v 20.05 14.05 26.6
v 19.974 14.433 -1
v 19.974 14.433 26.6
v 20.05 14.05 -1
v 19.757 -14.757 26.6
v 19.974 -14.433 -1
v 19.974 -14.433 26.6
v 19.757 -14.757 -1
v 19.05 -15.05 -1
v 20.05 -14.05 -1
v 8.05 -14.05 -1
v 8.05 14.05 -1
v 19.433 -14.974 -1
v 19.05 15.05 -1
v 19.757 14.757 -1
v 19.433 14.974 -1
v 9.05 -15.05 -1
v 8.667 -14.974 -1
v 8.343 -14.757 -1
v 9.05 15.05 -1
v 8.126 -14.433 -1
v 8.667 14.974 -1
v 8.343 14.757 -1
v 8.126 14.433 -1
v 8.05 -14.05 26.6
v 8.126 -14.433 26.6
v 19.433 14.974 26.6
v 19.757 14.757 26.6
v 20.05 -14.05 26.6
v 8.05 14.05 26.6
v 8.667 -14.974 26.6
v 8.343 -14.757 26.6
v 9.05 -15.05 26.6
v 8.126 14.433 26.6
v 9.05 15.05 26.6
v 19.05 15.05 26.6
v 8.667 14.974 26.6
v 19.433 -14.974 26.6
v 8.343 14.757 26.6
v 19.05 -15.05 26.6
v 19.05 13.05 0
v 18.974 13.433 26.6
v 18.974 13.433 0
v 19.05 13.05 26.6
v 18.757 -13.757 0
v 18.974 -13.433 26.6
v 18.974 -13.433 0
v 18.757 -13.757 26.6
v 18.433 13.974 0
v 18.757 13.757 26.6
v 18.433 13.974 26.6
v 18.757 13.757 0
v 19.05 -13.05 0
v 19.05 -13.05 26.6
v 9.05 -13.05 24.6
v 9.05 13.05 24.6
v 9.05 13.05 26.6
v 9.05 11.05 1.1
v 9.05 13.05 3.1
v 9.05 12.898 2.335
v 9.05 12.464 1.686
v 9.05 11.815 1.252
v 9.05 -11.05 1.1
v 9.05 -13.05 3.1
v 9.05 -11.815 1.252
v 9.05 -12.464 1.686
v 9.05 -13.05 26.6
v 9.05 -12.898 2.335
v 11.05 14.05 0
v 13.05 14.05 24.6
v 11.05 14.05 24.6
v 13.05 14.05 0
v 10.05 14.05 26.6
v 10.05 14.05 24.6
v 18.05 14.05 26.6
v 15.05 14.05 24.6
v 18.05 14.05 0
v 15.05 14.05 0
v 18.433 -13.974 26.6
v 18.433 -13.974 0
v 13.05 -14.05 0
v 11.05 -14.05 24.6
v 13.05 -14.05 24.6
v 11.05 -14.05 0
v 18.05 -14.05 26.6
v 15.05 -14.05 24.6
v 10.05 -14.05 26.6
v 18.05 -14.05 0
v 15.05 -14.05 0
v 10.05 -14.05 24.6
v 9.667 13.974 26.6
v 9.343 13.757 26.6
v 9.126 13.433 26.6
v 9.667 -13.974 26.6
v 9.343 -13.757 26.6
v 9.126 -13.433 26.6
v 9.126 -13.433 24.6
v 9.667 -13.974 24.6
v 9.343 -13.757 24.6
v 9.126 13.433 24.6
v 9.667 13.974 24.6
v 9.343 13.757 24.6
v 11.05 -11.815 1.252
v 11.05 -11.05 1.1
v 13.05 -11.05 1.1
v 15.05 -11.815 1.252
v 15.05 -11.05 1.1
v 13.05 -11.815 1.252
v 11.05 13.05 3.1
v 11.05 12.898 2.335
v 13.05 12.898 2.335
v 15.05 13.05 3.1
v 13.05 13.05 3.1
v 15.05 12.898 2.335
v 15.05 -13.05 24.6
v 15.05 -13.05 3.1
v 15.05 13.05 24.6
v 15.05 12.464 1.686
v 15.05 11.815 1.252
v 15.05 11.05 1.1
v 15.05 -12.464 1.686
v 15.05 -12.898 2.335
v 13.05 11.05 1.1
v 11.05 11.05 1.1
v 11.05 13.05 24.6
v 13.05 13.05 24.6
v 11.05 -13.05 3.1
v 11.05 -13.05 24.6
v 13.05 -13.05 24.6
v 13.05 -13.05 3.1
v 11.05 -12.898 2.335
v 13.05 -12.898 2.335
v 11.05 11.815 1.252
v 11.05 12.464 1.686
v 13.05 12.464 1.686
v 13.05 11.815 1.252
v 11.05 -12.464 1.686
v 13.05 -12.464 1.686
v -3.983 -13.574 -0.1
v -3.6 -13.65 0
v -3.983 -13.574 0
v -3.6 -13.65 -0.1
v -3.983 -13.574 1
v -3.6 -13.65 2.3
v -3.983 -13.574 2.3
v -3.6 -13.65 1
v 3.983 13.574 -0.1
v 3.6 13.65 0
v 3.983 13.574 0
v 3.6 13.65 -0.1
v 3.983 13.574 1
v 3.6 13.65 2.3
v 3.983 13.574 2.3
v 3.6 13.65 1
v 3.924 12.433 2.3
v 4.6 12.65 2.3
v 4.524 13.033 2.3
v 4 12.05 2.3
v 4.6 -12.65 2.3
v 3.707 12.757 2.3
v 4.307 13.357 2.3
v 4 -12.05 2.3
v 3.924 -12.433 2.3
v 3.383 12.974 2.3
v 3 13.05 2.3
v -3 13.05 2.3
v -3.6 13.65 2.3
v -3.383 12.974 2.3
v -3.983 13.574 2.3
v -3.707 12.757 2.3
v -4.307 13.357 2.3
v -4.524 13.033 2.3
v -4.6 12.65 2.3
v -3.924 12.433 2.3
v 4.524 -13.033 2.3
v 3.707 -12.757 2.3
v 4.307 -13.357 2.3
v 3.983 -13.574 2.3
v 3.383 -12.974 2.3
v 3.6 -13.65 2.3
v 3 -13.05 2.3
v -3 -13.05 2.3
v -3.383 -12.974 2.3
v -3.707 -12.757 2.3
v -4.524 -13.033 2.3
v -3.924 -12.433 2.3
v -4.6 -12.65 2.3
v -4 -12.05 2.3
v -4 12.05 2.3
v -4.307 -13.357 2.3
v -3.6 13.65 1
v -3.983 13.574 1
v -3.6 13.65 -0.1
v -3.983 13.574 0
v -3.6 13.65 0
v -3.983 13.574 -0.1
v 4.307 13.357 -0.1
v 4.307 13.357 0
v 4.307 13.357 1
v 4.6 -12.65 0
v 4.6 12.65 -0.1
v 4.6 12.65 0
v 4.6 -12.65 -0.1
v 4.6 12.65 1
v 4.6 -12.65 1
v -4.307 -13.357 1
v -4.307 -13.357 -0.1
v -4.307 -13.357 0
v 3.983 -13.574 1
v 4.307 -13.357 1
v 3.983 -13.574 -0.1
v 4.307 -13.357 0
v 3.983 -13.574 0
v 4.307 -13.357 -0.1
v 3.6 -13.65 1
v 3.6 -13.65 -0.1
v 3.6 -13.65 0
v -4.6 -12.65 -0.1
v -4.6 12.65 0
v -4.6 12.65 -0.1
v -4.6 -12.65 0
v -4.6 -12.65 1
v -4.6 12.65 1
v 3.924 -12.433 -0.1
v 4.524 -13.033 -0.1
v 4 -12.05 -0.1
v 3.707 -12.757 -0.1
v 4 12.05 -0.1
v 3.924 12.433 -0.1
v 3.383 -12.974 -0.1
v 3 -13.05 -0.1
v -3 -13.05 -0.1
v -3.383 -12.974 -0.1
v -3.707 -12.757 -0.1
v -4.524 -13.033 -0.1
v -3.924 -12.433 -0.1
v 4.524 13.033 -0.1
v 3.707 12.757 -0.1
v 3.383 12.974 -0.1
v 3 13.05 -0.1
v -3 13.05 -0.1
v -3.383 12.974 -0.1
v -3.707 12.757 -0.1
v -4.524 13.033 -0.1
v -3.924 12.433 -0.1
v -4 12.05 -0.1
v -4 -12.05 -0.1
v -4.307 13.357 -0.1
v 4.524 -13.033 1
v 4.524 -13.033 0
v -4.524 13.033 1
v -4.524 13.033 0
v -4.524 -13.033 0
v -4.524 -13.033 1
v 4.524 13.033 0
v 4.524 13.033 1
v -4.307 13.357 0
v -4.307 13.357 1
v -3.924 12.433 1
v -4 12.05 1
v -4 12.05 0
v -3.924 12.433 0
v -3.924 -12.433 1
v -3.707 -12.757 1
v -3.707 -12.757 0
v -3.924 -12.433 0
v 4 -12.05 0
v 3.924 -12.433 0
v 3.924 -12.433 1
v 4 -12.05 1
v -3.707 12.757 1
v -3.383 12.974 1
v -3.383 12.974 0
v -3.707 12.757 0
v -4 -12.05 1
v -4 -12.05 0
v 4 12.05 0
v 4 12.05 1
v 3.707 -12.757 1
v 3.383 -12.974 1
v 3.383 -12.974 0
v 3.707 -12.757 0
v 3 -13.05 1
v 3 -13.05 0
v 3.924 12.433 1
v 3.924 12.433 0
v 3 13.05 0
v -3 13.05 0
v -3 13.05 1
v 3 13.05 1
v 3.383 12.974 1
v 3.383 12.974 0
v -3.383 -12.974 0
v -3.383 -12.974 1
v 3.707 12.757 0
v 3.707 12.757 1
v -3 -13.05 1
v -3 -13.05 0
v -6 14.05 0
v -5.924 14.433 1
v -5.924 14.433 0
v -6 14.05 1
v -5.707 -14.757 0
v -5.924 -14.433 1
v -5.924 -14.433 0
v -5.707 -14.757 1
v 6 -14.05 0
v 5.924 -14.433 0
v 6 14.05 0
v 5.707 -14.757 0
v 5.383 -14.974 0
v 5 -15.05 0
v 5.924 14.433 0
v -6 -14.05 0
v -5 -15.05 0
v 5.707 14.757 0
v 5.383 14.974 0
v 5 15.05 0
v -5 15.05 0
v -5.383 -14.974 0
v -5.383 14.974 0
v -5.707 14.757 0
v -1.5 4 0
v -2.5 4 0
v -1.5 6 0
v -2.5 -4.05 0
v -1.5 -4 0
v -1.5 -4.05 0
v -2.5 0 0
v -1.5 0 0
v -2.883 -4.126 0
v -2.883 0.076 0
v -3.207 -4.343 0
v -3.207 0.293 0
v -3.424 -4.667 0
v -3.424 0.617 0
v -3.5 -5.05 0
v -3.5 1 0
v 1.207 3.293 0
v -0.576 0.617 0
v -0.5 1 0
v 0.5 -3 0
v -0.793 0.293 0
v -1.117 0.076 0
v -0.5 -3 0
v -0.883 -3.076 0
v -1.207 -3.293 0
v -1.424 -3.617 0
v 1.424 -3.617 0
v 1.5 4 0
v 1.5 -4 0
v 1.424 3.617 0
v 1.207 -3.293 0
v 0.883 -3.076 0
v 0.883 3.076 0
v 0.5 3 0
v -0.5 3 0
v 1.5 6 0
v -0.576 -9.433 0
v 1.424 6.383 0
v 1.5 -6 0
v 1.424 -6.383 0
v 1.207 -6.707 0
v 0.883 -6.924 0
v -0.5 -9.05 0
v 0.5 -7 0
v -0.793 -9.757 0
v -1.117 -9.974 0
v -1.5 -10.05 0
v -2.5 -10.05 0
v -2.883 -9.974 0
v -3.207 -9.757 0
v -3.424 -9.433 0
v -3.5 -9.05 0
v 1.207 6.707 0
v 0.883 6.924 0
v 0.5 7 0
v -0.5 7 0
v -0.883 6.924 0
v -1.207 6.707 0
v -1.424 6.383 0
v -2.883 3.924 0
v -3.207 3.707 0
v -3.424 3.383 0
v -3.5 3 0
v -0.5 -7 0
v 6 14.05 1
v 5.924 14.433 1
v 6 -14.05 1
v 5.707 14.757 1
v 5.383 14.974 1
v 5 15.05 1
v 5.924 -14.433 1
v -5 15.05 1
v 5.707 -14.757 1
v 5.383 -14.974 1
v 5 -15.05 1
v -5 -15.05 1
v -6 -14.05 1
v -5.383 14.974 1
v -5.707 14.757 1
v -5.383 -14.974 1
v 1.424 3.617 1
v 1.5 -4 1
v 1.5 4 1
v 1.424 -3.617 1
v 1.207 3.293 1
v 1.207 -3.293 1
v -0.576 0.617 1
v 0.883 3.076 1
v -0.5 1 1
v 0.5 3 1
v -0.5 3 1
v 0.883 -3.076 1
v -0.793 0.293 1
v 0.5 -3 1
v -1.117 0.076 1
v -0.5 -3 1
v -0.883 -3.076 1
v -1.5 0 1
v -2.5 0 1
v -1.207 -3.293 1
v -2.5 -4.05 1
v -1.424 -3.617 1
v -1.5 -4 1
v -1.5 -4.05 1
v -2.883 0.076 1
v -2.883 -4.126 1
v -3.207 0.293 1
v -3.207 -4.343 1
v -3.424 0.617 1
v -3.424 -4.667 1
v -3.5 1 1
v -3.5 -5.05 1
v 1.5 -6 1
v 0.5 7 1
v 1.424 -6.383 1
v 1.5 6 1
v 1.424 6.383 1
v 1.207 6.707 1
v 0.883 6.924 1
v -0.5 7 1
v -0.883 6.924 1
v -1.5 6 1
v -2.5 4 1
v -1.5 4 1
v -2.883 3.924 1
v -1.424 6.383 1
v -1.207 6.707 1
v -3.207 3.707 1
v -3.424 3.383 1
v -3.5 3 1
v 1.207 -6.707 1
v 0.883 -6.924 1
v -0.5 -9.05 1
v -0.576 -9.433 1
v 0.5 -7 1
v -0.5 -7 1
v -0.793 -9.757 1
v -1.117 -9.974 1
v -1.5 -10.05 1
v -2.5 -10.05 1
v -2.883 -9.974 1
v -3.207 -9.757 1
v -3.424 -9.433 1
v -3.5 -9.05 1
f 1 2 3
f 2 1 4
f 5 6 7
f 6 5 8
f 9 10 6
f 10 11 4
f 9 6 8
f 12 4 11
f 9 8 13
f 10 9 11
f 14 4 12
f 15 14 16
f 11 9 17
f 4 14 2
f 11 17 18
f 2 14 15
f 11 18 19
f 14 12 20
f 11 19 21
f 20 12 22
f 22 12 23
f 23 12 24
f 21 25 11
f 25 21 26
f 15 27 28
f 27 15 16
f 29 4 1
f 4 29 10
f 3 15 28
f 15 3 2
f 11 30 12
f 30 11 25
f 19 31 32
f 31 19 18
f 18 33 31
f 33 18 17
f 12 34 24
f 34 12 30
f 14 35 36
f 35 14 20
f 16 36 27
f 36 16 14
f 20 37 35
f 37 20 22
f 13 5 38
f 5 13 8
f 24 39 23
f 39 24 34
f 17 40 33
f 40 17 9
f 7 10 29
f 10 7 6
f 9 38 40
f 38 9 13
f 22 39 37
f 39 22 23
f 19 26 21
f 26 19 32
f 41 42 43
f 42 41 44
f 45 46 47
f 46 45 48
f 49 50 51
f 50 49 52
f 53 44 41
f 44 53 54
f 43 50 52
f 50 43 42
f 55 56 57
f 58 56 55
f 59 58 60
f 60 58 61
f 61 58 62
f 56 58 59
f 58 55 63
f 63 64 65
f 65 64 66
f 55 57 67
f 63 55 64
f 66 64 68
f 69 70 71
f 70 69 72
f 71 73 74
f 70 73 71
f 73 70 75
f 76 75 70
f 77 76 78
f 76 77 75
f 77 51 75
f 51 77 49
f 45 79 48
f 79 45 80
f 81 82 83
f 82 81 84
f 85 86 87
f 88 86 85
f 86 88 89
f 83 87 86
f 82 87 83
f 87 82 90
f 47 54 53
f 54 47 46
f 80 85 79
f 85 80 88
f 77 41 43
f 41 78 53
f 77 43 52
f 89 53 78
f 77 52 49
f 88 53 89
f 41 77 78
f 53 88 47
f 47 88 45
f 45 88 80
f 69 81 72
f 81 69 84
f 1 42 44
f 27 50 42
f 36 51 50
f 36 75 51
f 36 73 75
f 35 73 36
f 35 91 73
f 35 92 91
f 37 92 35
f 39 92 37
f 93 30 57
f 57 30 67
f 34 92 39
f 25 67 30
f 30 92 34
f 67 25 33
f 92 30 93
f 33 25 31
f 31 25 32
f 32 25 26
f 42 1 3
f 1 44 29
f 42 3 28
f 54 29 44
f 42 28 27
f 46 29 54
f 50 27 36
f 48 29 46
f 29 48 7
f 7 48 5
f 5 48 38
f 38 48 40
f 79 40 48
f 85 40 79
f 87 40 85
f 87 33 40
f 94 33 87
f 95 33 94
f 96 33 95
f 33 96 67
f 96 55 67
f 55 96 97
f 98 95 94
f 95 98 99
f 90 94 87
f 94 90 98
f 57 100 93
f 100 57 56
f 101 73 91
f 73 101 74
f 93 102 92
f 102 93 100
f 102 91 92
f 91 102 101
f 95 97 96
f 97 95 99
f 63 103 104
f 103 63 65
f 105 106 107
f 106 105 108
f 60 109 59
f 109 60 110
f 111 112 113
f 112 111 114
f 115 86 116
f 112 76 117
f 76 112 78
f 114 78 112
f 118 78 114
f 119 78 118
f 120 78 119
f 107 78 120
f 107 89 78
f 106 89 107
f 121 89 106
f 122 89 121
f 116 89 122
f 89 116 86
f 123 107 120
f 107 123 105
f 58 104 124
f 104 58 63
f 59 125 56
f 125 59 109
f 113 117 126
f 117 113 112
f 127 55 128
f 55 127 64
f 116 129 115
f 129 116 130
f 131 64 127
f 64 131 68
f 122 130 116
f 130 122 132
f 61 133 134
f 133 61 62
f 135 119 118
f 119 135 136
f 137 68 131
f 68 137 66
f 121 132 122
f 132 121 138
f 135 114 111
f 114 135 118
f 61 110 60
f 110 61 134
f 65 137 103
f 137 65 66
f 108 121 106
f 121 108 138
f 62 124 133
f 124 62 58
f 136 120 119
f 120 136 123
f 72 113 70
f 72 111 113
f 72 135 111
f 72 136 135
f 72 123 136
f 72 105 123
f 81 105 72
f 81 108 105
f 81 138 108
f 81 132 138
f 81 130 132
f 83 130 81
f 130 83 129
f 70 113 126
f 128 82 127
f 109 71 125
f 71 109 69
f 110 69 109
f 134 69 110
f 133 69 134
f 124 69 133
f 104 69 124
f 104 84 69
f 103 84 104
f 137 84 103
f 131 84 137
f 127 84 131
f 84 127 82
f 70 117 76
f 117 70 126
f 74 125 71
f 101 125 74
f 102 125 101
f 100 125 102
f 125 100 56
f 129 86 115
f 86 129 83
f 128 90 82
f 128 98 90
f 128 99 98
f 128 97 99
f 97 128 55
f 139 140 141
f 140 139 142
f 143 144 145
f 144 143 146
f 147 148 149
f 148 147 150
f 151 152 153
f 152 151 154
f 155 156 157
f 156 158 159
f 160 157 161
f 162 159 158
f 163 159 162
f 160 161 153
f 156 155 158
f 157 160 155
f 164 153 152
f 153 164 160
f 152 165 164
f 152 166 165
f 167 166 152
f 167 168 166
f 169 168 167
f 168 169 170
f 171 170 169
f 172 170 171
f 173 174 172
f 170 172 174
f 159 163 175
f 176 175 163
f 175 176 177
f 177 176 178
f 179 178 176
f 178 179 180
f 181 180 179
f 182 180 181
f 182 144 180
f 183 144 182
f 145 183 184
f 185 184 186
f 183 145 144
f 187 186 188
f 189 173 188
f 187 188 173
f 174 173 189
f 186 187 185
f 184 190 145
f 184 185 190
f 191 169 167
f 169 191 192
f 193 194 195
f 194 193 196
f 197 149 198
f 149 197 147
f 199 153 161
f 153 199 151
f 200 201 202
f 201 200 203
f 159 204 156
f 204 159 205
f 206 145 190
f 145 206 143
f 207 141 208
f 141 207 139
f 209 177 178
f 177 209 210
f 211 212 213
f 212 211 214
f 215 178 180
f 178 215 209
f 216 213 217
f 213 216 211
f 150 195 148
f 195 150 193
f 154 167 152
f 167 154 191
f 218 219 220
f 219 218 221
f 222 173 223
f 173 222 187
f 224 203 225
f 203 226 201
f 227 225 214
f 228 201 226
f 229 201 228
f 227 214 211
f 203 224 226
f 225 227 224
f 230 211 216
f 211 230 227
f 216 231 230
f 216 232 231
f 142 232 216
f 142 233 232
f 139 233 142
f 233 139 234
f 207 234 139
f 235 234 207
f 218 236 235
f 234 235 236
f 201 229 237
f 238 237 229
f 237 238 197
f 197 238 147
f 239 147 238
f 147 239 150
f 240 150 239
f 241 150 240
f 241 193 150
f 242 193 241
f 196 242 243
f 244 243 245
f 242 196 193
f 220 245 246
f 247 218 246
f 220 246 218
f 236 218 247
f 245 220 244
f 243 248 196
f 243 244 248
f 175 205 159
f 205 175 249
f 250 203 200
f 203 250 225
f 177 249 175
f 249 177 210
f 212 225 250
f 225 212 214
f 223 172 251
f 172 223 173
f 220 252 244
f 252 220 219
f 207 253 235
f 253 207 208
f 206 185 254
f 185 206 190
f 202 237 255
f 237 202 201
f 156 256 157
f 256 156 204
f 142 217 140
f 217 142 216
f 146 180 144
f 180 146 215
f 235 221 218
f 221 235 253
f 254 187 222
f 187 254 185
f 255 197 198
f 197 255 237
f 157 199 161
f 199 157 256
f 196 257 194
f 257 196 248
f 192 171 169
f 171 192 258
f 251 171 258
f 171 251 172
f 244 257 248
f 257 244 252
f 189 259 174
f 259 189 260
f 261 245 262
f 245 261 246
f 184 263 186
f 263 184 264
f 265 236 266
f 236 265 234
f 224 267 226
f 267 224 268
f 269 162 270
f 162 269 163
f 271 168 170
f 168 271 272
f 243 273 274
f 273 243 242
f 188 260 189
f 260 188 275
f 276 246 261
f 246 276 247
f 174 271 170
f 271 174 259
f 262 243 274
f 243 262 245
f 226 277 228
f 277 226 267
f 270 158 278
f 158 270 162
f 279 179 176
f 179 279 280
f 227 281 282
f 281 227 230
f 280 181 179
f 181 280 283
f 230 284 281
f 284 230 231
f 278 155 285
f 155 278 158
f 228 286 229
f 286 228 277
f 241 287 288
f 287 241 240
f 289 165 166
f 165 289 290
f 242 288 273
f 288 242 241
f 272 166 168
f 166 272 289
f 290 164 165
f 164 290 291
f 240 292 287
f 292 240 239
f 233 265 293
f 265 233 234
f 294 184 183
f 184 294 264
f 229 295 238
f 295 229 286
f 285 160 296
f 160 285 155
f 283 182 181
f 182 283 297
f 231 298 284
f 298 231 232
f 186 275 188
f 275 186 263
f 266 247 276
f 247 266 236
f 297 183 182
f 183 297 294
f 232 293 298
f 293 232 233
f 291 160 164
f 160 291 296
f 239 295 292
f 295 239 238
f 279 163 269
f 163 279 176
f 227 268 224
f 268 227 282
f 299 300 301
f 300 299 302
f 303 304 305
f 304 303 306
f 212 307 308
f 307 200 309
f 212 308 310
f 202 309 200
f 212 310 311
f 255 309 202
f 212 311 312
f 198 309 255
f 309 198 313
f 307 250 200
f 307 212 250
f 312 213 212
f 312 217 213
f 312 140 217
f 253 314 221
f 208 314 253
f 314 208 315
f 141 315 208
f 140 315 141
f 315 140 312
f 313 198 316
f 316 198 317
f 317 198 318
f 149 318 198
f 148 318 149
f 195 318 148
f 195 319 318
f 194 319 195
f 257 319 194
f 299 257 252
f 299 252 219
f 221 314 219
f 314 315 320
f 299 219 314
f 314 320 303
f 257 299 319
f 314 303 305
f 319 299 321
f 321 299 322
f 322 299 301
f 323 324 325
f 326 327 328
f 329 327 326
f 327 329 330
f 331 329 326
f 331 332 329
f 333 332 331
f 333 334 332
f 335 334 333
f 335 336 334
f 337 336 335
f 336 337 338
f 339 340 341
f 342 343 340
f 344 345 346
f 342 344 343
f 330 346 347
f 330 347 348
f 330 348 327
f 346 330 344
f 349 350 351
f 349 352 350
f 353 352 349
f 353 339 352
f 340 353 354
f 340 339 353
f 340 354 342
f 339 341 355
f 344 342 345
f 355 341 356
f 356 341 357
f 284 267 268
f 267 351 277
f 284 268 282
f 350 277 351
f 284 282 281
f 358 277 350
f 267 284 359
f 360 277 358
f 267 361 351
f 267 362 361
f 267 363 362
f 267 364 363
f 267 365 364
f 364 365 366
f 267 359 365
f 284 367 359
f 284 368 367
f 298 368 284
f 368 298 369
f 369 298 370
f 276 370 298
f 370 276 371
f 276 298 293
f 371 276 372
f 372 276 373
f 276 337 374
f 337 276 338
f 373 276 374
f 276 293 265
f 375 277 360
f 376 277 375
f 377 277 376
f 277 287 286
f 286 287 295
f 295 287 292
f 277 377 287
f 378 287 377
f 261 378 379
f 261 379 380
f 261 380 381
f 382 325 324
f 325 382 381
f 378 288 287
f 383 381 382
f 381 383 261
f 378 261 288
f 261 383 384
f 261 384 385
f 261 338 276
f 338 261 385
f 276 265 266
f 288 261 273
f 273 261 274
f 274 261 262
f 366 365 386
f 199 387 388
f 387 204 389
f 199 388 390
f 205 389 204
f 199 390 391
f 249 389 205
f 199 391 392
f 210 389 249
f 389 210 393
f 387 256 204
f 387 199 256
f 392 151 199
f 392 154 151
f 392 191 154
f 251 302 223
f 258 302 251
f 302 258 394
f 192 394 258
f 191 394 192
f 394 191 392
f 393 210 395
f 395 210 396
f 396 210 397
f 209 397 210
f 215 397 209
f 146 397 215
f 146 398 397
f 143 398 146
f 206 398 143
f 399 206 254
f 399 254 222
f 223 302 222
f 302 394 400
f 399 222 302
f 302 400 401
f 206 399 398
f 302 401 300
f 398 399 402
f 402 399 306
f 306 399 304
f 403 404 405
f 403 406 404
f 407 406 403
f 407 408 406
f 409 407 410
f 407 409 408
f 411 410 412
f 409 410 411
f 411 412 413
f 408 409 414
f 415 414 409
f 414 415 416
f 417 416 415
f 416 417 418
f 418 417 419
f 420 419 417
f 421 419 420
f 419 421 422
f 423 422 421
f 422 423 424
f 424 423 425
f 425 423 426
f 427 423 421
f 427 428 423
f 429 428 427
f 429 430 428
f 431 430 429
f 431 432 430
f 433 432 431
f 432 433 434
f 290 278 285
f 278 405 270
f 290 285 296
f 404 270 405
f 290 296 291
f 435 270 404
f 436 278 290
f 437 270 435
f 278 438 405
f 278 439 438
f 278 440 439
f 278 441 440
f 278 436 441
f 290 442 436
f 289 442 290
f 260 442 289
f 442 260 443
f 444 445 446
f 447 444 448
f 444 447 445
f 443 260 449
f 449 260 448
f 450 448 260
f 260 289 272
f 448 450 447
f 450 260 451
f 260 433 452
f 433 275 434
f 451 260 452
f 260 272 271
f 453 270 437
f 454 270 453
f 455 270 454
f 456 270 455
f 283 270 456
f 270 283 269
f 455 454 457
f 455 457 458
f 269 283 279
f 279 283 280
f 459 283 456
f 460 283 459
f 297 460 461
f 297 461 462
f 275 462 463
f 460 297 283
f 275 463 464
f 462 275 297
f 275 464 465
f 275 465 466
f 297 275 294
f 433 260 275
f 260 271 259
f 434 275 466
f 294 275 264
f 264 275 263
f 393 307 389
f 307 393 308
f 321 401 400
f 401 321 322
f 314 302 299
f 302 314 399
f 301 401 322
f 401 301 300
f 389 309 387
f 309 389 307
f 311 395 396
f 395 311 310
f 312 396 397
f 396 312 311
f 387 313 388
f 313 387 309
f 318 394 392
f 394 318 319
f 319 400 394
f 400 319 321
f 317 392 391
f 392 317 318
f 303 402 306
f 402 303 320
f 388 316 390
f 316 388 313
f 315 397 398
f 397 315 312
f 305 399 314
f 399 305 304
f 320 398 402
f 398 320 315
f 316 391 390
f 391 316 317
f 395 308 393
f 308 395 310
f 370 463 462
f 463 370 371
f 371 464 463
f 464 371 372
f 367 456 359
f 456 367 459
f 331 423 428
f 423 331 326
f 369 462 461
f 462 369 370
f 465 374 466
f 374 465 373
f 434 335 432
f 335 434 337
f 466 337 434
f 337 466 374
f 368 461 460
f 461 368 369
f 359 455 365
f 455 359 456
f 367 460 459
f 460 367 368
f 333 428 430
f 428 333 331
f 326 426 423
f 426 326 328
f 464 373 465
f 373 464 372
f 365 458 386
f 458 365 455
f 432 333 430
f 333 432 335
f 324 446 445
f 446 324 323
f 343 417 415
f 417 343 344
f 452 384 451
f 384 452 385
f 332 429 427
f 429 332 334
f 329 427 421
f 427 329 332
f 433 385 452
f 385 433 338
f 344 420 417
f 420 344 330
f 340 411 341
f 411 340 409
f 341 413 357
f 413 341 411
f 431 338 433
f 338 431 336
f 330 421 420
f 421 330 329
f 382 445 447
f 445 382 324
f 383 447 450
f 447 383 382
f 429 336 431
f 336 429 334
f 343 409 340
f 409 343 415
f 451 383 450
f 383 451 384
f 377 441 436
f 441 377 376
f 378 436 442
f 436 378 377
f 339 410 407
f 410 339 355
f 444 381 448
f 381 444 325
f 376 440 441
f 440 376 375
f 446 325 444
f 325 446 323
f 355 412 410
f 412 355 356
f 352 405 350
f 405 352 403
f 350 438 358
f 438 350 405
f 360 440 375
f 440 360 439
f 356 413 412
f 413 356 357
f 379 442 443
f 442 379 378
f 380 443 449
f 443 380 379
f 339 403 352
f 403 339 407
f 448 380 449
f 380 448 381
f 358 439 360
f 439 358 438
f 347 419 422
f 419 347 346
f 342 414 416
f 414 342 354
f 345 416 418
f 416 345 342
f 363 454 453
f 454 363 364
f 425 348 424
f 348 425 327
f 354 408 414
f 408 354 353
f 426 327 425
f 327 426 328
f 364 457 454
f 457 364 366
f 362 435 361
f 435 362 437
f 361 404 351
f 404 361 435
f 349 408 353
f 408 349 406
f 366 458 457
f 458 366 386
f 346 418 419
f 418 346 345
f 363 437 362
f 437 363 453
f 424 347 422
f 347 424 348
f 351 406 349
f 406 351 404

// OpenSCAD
use <../MAX98306.scad>
max98306(with_vent=0, with_holder=1, with_lid=1, with_print=1);
